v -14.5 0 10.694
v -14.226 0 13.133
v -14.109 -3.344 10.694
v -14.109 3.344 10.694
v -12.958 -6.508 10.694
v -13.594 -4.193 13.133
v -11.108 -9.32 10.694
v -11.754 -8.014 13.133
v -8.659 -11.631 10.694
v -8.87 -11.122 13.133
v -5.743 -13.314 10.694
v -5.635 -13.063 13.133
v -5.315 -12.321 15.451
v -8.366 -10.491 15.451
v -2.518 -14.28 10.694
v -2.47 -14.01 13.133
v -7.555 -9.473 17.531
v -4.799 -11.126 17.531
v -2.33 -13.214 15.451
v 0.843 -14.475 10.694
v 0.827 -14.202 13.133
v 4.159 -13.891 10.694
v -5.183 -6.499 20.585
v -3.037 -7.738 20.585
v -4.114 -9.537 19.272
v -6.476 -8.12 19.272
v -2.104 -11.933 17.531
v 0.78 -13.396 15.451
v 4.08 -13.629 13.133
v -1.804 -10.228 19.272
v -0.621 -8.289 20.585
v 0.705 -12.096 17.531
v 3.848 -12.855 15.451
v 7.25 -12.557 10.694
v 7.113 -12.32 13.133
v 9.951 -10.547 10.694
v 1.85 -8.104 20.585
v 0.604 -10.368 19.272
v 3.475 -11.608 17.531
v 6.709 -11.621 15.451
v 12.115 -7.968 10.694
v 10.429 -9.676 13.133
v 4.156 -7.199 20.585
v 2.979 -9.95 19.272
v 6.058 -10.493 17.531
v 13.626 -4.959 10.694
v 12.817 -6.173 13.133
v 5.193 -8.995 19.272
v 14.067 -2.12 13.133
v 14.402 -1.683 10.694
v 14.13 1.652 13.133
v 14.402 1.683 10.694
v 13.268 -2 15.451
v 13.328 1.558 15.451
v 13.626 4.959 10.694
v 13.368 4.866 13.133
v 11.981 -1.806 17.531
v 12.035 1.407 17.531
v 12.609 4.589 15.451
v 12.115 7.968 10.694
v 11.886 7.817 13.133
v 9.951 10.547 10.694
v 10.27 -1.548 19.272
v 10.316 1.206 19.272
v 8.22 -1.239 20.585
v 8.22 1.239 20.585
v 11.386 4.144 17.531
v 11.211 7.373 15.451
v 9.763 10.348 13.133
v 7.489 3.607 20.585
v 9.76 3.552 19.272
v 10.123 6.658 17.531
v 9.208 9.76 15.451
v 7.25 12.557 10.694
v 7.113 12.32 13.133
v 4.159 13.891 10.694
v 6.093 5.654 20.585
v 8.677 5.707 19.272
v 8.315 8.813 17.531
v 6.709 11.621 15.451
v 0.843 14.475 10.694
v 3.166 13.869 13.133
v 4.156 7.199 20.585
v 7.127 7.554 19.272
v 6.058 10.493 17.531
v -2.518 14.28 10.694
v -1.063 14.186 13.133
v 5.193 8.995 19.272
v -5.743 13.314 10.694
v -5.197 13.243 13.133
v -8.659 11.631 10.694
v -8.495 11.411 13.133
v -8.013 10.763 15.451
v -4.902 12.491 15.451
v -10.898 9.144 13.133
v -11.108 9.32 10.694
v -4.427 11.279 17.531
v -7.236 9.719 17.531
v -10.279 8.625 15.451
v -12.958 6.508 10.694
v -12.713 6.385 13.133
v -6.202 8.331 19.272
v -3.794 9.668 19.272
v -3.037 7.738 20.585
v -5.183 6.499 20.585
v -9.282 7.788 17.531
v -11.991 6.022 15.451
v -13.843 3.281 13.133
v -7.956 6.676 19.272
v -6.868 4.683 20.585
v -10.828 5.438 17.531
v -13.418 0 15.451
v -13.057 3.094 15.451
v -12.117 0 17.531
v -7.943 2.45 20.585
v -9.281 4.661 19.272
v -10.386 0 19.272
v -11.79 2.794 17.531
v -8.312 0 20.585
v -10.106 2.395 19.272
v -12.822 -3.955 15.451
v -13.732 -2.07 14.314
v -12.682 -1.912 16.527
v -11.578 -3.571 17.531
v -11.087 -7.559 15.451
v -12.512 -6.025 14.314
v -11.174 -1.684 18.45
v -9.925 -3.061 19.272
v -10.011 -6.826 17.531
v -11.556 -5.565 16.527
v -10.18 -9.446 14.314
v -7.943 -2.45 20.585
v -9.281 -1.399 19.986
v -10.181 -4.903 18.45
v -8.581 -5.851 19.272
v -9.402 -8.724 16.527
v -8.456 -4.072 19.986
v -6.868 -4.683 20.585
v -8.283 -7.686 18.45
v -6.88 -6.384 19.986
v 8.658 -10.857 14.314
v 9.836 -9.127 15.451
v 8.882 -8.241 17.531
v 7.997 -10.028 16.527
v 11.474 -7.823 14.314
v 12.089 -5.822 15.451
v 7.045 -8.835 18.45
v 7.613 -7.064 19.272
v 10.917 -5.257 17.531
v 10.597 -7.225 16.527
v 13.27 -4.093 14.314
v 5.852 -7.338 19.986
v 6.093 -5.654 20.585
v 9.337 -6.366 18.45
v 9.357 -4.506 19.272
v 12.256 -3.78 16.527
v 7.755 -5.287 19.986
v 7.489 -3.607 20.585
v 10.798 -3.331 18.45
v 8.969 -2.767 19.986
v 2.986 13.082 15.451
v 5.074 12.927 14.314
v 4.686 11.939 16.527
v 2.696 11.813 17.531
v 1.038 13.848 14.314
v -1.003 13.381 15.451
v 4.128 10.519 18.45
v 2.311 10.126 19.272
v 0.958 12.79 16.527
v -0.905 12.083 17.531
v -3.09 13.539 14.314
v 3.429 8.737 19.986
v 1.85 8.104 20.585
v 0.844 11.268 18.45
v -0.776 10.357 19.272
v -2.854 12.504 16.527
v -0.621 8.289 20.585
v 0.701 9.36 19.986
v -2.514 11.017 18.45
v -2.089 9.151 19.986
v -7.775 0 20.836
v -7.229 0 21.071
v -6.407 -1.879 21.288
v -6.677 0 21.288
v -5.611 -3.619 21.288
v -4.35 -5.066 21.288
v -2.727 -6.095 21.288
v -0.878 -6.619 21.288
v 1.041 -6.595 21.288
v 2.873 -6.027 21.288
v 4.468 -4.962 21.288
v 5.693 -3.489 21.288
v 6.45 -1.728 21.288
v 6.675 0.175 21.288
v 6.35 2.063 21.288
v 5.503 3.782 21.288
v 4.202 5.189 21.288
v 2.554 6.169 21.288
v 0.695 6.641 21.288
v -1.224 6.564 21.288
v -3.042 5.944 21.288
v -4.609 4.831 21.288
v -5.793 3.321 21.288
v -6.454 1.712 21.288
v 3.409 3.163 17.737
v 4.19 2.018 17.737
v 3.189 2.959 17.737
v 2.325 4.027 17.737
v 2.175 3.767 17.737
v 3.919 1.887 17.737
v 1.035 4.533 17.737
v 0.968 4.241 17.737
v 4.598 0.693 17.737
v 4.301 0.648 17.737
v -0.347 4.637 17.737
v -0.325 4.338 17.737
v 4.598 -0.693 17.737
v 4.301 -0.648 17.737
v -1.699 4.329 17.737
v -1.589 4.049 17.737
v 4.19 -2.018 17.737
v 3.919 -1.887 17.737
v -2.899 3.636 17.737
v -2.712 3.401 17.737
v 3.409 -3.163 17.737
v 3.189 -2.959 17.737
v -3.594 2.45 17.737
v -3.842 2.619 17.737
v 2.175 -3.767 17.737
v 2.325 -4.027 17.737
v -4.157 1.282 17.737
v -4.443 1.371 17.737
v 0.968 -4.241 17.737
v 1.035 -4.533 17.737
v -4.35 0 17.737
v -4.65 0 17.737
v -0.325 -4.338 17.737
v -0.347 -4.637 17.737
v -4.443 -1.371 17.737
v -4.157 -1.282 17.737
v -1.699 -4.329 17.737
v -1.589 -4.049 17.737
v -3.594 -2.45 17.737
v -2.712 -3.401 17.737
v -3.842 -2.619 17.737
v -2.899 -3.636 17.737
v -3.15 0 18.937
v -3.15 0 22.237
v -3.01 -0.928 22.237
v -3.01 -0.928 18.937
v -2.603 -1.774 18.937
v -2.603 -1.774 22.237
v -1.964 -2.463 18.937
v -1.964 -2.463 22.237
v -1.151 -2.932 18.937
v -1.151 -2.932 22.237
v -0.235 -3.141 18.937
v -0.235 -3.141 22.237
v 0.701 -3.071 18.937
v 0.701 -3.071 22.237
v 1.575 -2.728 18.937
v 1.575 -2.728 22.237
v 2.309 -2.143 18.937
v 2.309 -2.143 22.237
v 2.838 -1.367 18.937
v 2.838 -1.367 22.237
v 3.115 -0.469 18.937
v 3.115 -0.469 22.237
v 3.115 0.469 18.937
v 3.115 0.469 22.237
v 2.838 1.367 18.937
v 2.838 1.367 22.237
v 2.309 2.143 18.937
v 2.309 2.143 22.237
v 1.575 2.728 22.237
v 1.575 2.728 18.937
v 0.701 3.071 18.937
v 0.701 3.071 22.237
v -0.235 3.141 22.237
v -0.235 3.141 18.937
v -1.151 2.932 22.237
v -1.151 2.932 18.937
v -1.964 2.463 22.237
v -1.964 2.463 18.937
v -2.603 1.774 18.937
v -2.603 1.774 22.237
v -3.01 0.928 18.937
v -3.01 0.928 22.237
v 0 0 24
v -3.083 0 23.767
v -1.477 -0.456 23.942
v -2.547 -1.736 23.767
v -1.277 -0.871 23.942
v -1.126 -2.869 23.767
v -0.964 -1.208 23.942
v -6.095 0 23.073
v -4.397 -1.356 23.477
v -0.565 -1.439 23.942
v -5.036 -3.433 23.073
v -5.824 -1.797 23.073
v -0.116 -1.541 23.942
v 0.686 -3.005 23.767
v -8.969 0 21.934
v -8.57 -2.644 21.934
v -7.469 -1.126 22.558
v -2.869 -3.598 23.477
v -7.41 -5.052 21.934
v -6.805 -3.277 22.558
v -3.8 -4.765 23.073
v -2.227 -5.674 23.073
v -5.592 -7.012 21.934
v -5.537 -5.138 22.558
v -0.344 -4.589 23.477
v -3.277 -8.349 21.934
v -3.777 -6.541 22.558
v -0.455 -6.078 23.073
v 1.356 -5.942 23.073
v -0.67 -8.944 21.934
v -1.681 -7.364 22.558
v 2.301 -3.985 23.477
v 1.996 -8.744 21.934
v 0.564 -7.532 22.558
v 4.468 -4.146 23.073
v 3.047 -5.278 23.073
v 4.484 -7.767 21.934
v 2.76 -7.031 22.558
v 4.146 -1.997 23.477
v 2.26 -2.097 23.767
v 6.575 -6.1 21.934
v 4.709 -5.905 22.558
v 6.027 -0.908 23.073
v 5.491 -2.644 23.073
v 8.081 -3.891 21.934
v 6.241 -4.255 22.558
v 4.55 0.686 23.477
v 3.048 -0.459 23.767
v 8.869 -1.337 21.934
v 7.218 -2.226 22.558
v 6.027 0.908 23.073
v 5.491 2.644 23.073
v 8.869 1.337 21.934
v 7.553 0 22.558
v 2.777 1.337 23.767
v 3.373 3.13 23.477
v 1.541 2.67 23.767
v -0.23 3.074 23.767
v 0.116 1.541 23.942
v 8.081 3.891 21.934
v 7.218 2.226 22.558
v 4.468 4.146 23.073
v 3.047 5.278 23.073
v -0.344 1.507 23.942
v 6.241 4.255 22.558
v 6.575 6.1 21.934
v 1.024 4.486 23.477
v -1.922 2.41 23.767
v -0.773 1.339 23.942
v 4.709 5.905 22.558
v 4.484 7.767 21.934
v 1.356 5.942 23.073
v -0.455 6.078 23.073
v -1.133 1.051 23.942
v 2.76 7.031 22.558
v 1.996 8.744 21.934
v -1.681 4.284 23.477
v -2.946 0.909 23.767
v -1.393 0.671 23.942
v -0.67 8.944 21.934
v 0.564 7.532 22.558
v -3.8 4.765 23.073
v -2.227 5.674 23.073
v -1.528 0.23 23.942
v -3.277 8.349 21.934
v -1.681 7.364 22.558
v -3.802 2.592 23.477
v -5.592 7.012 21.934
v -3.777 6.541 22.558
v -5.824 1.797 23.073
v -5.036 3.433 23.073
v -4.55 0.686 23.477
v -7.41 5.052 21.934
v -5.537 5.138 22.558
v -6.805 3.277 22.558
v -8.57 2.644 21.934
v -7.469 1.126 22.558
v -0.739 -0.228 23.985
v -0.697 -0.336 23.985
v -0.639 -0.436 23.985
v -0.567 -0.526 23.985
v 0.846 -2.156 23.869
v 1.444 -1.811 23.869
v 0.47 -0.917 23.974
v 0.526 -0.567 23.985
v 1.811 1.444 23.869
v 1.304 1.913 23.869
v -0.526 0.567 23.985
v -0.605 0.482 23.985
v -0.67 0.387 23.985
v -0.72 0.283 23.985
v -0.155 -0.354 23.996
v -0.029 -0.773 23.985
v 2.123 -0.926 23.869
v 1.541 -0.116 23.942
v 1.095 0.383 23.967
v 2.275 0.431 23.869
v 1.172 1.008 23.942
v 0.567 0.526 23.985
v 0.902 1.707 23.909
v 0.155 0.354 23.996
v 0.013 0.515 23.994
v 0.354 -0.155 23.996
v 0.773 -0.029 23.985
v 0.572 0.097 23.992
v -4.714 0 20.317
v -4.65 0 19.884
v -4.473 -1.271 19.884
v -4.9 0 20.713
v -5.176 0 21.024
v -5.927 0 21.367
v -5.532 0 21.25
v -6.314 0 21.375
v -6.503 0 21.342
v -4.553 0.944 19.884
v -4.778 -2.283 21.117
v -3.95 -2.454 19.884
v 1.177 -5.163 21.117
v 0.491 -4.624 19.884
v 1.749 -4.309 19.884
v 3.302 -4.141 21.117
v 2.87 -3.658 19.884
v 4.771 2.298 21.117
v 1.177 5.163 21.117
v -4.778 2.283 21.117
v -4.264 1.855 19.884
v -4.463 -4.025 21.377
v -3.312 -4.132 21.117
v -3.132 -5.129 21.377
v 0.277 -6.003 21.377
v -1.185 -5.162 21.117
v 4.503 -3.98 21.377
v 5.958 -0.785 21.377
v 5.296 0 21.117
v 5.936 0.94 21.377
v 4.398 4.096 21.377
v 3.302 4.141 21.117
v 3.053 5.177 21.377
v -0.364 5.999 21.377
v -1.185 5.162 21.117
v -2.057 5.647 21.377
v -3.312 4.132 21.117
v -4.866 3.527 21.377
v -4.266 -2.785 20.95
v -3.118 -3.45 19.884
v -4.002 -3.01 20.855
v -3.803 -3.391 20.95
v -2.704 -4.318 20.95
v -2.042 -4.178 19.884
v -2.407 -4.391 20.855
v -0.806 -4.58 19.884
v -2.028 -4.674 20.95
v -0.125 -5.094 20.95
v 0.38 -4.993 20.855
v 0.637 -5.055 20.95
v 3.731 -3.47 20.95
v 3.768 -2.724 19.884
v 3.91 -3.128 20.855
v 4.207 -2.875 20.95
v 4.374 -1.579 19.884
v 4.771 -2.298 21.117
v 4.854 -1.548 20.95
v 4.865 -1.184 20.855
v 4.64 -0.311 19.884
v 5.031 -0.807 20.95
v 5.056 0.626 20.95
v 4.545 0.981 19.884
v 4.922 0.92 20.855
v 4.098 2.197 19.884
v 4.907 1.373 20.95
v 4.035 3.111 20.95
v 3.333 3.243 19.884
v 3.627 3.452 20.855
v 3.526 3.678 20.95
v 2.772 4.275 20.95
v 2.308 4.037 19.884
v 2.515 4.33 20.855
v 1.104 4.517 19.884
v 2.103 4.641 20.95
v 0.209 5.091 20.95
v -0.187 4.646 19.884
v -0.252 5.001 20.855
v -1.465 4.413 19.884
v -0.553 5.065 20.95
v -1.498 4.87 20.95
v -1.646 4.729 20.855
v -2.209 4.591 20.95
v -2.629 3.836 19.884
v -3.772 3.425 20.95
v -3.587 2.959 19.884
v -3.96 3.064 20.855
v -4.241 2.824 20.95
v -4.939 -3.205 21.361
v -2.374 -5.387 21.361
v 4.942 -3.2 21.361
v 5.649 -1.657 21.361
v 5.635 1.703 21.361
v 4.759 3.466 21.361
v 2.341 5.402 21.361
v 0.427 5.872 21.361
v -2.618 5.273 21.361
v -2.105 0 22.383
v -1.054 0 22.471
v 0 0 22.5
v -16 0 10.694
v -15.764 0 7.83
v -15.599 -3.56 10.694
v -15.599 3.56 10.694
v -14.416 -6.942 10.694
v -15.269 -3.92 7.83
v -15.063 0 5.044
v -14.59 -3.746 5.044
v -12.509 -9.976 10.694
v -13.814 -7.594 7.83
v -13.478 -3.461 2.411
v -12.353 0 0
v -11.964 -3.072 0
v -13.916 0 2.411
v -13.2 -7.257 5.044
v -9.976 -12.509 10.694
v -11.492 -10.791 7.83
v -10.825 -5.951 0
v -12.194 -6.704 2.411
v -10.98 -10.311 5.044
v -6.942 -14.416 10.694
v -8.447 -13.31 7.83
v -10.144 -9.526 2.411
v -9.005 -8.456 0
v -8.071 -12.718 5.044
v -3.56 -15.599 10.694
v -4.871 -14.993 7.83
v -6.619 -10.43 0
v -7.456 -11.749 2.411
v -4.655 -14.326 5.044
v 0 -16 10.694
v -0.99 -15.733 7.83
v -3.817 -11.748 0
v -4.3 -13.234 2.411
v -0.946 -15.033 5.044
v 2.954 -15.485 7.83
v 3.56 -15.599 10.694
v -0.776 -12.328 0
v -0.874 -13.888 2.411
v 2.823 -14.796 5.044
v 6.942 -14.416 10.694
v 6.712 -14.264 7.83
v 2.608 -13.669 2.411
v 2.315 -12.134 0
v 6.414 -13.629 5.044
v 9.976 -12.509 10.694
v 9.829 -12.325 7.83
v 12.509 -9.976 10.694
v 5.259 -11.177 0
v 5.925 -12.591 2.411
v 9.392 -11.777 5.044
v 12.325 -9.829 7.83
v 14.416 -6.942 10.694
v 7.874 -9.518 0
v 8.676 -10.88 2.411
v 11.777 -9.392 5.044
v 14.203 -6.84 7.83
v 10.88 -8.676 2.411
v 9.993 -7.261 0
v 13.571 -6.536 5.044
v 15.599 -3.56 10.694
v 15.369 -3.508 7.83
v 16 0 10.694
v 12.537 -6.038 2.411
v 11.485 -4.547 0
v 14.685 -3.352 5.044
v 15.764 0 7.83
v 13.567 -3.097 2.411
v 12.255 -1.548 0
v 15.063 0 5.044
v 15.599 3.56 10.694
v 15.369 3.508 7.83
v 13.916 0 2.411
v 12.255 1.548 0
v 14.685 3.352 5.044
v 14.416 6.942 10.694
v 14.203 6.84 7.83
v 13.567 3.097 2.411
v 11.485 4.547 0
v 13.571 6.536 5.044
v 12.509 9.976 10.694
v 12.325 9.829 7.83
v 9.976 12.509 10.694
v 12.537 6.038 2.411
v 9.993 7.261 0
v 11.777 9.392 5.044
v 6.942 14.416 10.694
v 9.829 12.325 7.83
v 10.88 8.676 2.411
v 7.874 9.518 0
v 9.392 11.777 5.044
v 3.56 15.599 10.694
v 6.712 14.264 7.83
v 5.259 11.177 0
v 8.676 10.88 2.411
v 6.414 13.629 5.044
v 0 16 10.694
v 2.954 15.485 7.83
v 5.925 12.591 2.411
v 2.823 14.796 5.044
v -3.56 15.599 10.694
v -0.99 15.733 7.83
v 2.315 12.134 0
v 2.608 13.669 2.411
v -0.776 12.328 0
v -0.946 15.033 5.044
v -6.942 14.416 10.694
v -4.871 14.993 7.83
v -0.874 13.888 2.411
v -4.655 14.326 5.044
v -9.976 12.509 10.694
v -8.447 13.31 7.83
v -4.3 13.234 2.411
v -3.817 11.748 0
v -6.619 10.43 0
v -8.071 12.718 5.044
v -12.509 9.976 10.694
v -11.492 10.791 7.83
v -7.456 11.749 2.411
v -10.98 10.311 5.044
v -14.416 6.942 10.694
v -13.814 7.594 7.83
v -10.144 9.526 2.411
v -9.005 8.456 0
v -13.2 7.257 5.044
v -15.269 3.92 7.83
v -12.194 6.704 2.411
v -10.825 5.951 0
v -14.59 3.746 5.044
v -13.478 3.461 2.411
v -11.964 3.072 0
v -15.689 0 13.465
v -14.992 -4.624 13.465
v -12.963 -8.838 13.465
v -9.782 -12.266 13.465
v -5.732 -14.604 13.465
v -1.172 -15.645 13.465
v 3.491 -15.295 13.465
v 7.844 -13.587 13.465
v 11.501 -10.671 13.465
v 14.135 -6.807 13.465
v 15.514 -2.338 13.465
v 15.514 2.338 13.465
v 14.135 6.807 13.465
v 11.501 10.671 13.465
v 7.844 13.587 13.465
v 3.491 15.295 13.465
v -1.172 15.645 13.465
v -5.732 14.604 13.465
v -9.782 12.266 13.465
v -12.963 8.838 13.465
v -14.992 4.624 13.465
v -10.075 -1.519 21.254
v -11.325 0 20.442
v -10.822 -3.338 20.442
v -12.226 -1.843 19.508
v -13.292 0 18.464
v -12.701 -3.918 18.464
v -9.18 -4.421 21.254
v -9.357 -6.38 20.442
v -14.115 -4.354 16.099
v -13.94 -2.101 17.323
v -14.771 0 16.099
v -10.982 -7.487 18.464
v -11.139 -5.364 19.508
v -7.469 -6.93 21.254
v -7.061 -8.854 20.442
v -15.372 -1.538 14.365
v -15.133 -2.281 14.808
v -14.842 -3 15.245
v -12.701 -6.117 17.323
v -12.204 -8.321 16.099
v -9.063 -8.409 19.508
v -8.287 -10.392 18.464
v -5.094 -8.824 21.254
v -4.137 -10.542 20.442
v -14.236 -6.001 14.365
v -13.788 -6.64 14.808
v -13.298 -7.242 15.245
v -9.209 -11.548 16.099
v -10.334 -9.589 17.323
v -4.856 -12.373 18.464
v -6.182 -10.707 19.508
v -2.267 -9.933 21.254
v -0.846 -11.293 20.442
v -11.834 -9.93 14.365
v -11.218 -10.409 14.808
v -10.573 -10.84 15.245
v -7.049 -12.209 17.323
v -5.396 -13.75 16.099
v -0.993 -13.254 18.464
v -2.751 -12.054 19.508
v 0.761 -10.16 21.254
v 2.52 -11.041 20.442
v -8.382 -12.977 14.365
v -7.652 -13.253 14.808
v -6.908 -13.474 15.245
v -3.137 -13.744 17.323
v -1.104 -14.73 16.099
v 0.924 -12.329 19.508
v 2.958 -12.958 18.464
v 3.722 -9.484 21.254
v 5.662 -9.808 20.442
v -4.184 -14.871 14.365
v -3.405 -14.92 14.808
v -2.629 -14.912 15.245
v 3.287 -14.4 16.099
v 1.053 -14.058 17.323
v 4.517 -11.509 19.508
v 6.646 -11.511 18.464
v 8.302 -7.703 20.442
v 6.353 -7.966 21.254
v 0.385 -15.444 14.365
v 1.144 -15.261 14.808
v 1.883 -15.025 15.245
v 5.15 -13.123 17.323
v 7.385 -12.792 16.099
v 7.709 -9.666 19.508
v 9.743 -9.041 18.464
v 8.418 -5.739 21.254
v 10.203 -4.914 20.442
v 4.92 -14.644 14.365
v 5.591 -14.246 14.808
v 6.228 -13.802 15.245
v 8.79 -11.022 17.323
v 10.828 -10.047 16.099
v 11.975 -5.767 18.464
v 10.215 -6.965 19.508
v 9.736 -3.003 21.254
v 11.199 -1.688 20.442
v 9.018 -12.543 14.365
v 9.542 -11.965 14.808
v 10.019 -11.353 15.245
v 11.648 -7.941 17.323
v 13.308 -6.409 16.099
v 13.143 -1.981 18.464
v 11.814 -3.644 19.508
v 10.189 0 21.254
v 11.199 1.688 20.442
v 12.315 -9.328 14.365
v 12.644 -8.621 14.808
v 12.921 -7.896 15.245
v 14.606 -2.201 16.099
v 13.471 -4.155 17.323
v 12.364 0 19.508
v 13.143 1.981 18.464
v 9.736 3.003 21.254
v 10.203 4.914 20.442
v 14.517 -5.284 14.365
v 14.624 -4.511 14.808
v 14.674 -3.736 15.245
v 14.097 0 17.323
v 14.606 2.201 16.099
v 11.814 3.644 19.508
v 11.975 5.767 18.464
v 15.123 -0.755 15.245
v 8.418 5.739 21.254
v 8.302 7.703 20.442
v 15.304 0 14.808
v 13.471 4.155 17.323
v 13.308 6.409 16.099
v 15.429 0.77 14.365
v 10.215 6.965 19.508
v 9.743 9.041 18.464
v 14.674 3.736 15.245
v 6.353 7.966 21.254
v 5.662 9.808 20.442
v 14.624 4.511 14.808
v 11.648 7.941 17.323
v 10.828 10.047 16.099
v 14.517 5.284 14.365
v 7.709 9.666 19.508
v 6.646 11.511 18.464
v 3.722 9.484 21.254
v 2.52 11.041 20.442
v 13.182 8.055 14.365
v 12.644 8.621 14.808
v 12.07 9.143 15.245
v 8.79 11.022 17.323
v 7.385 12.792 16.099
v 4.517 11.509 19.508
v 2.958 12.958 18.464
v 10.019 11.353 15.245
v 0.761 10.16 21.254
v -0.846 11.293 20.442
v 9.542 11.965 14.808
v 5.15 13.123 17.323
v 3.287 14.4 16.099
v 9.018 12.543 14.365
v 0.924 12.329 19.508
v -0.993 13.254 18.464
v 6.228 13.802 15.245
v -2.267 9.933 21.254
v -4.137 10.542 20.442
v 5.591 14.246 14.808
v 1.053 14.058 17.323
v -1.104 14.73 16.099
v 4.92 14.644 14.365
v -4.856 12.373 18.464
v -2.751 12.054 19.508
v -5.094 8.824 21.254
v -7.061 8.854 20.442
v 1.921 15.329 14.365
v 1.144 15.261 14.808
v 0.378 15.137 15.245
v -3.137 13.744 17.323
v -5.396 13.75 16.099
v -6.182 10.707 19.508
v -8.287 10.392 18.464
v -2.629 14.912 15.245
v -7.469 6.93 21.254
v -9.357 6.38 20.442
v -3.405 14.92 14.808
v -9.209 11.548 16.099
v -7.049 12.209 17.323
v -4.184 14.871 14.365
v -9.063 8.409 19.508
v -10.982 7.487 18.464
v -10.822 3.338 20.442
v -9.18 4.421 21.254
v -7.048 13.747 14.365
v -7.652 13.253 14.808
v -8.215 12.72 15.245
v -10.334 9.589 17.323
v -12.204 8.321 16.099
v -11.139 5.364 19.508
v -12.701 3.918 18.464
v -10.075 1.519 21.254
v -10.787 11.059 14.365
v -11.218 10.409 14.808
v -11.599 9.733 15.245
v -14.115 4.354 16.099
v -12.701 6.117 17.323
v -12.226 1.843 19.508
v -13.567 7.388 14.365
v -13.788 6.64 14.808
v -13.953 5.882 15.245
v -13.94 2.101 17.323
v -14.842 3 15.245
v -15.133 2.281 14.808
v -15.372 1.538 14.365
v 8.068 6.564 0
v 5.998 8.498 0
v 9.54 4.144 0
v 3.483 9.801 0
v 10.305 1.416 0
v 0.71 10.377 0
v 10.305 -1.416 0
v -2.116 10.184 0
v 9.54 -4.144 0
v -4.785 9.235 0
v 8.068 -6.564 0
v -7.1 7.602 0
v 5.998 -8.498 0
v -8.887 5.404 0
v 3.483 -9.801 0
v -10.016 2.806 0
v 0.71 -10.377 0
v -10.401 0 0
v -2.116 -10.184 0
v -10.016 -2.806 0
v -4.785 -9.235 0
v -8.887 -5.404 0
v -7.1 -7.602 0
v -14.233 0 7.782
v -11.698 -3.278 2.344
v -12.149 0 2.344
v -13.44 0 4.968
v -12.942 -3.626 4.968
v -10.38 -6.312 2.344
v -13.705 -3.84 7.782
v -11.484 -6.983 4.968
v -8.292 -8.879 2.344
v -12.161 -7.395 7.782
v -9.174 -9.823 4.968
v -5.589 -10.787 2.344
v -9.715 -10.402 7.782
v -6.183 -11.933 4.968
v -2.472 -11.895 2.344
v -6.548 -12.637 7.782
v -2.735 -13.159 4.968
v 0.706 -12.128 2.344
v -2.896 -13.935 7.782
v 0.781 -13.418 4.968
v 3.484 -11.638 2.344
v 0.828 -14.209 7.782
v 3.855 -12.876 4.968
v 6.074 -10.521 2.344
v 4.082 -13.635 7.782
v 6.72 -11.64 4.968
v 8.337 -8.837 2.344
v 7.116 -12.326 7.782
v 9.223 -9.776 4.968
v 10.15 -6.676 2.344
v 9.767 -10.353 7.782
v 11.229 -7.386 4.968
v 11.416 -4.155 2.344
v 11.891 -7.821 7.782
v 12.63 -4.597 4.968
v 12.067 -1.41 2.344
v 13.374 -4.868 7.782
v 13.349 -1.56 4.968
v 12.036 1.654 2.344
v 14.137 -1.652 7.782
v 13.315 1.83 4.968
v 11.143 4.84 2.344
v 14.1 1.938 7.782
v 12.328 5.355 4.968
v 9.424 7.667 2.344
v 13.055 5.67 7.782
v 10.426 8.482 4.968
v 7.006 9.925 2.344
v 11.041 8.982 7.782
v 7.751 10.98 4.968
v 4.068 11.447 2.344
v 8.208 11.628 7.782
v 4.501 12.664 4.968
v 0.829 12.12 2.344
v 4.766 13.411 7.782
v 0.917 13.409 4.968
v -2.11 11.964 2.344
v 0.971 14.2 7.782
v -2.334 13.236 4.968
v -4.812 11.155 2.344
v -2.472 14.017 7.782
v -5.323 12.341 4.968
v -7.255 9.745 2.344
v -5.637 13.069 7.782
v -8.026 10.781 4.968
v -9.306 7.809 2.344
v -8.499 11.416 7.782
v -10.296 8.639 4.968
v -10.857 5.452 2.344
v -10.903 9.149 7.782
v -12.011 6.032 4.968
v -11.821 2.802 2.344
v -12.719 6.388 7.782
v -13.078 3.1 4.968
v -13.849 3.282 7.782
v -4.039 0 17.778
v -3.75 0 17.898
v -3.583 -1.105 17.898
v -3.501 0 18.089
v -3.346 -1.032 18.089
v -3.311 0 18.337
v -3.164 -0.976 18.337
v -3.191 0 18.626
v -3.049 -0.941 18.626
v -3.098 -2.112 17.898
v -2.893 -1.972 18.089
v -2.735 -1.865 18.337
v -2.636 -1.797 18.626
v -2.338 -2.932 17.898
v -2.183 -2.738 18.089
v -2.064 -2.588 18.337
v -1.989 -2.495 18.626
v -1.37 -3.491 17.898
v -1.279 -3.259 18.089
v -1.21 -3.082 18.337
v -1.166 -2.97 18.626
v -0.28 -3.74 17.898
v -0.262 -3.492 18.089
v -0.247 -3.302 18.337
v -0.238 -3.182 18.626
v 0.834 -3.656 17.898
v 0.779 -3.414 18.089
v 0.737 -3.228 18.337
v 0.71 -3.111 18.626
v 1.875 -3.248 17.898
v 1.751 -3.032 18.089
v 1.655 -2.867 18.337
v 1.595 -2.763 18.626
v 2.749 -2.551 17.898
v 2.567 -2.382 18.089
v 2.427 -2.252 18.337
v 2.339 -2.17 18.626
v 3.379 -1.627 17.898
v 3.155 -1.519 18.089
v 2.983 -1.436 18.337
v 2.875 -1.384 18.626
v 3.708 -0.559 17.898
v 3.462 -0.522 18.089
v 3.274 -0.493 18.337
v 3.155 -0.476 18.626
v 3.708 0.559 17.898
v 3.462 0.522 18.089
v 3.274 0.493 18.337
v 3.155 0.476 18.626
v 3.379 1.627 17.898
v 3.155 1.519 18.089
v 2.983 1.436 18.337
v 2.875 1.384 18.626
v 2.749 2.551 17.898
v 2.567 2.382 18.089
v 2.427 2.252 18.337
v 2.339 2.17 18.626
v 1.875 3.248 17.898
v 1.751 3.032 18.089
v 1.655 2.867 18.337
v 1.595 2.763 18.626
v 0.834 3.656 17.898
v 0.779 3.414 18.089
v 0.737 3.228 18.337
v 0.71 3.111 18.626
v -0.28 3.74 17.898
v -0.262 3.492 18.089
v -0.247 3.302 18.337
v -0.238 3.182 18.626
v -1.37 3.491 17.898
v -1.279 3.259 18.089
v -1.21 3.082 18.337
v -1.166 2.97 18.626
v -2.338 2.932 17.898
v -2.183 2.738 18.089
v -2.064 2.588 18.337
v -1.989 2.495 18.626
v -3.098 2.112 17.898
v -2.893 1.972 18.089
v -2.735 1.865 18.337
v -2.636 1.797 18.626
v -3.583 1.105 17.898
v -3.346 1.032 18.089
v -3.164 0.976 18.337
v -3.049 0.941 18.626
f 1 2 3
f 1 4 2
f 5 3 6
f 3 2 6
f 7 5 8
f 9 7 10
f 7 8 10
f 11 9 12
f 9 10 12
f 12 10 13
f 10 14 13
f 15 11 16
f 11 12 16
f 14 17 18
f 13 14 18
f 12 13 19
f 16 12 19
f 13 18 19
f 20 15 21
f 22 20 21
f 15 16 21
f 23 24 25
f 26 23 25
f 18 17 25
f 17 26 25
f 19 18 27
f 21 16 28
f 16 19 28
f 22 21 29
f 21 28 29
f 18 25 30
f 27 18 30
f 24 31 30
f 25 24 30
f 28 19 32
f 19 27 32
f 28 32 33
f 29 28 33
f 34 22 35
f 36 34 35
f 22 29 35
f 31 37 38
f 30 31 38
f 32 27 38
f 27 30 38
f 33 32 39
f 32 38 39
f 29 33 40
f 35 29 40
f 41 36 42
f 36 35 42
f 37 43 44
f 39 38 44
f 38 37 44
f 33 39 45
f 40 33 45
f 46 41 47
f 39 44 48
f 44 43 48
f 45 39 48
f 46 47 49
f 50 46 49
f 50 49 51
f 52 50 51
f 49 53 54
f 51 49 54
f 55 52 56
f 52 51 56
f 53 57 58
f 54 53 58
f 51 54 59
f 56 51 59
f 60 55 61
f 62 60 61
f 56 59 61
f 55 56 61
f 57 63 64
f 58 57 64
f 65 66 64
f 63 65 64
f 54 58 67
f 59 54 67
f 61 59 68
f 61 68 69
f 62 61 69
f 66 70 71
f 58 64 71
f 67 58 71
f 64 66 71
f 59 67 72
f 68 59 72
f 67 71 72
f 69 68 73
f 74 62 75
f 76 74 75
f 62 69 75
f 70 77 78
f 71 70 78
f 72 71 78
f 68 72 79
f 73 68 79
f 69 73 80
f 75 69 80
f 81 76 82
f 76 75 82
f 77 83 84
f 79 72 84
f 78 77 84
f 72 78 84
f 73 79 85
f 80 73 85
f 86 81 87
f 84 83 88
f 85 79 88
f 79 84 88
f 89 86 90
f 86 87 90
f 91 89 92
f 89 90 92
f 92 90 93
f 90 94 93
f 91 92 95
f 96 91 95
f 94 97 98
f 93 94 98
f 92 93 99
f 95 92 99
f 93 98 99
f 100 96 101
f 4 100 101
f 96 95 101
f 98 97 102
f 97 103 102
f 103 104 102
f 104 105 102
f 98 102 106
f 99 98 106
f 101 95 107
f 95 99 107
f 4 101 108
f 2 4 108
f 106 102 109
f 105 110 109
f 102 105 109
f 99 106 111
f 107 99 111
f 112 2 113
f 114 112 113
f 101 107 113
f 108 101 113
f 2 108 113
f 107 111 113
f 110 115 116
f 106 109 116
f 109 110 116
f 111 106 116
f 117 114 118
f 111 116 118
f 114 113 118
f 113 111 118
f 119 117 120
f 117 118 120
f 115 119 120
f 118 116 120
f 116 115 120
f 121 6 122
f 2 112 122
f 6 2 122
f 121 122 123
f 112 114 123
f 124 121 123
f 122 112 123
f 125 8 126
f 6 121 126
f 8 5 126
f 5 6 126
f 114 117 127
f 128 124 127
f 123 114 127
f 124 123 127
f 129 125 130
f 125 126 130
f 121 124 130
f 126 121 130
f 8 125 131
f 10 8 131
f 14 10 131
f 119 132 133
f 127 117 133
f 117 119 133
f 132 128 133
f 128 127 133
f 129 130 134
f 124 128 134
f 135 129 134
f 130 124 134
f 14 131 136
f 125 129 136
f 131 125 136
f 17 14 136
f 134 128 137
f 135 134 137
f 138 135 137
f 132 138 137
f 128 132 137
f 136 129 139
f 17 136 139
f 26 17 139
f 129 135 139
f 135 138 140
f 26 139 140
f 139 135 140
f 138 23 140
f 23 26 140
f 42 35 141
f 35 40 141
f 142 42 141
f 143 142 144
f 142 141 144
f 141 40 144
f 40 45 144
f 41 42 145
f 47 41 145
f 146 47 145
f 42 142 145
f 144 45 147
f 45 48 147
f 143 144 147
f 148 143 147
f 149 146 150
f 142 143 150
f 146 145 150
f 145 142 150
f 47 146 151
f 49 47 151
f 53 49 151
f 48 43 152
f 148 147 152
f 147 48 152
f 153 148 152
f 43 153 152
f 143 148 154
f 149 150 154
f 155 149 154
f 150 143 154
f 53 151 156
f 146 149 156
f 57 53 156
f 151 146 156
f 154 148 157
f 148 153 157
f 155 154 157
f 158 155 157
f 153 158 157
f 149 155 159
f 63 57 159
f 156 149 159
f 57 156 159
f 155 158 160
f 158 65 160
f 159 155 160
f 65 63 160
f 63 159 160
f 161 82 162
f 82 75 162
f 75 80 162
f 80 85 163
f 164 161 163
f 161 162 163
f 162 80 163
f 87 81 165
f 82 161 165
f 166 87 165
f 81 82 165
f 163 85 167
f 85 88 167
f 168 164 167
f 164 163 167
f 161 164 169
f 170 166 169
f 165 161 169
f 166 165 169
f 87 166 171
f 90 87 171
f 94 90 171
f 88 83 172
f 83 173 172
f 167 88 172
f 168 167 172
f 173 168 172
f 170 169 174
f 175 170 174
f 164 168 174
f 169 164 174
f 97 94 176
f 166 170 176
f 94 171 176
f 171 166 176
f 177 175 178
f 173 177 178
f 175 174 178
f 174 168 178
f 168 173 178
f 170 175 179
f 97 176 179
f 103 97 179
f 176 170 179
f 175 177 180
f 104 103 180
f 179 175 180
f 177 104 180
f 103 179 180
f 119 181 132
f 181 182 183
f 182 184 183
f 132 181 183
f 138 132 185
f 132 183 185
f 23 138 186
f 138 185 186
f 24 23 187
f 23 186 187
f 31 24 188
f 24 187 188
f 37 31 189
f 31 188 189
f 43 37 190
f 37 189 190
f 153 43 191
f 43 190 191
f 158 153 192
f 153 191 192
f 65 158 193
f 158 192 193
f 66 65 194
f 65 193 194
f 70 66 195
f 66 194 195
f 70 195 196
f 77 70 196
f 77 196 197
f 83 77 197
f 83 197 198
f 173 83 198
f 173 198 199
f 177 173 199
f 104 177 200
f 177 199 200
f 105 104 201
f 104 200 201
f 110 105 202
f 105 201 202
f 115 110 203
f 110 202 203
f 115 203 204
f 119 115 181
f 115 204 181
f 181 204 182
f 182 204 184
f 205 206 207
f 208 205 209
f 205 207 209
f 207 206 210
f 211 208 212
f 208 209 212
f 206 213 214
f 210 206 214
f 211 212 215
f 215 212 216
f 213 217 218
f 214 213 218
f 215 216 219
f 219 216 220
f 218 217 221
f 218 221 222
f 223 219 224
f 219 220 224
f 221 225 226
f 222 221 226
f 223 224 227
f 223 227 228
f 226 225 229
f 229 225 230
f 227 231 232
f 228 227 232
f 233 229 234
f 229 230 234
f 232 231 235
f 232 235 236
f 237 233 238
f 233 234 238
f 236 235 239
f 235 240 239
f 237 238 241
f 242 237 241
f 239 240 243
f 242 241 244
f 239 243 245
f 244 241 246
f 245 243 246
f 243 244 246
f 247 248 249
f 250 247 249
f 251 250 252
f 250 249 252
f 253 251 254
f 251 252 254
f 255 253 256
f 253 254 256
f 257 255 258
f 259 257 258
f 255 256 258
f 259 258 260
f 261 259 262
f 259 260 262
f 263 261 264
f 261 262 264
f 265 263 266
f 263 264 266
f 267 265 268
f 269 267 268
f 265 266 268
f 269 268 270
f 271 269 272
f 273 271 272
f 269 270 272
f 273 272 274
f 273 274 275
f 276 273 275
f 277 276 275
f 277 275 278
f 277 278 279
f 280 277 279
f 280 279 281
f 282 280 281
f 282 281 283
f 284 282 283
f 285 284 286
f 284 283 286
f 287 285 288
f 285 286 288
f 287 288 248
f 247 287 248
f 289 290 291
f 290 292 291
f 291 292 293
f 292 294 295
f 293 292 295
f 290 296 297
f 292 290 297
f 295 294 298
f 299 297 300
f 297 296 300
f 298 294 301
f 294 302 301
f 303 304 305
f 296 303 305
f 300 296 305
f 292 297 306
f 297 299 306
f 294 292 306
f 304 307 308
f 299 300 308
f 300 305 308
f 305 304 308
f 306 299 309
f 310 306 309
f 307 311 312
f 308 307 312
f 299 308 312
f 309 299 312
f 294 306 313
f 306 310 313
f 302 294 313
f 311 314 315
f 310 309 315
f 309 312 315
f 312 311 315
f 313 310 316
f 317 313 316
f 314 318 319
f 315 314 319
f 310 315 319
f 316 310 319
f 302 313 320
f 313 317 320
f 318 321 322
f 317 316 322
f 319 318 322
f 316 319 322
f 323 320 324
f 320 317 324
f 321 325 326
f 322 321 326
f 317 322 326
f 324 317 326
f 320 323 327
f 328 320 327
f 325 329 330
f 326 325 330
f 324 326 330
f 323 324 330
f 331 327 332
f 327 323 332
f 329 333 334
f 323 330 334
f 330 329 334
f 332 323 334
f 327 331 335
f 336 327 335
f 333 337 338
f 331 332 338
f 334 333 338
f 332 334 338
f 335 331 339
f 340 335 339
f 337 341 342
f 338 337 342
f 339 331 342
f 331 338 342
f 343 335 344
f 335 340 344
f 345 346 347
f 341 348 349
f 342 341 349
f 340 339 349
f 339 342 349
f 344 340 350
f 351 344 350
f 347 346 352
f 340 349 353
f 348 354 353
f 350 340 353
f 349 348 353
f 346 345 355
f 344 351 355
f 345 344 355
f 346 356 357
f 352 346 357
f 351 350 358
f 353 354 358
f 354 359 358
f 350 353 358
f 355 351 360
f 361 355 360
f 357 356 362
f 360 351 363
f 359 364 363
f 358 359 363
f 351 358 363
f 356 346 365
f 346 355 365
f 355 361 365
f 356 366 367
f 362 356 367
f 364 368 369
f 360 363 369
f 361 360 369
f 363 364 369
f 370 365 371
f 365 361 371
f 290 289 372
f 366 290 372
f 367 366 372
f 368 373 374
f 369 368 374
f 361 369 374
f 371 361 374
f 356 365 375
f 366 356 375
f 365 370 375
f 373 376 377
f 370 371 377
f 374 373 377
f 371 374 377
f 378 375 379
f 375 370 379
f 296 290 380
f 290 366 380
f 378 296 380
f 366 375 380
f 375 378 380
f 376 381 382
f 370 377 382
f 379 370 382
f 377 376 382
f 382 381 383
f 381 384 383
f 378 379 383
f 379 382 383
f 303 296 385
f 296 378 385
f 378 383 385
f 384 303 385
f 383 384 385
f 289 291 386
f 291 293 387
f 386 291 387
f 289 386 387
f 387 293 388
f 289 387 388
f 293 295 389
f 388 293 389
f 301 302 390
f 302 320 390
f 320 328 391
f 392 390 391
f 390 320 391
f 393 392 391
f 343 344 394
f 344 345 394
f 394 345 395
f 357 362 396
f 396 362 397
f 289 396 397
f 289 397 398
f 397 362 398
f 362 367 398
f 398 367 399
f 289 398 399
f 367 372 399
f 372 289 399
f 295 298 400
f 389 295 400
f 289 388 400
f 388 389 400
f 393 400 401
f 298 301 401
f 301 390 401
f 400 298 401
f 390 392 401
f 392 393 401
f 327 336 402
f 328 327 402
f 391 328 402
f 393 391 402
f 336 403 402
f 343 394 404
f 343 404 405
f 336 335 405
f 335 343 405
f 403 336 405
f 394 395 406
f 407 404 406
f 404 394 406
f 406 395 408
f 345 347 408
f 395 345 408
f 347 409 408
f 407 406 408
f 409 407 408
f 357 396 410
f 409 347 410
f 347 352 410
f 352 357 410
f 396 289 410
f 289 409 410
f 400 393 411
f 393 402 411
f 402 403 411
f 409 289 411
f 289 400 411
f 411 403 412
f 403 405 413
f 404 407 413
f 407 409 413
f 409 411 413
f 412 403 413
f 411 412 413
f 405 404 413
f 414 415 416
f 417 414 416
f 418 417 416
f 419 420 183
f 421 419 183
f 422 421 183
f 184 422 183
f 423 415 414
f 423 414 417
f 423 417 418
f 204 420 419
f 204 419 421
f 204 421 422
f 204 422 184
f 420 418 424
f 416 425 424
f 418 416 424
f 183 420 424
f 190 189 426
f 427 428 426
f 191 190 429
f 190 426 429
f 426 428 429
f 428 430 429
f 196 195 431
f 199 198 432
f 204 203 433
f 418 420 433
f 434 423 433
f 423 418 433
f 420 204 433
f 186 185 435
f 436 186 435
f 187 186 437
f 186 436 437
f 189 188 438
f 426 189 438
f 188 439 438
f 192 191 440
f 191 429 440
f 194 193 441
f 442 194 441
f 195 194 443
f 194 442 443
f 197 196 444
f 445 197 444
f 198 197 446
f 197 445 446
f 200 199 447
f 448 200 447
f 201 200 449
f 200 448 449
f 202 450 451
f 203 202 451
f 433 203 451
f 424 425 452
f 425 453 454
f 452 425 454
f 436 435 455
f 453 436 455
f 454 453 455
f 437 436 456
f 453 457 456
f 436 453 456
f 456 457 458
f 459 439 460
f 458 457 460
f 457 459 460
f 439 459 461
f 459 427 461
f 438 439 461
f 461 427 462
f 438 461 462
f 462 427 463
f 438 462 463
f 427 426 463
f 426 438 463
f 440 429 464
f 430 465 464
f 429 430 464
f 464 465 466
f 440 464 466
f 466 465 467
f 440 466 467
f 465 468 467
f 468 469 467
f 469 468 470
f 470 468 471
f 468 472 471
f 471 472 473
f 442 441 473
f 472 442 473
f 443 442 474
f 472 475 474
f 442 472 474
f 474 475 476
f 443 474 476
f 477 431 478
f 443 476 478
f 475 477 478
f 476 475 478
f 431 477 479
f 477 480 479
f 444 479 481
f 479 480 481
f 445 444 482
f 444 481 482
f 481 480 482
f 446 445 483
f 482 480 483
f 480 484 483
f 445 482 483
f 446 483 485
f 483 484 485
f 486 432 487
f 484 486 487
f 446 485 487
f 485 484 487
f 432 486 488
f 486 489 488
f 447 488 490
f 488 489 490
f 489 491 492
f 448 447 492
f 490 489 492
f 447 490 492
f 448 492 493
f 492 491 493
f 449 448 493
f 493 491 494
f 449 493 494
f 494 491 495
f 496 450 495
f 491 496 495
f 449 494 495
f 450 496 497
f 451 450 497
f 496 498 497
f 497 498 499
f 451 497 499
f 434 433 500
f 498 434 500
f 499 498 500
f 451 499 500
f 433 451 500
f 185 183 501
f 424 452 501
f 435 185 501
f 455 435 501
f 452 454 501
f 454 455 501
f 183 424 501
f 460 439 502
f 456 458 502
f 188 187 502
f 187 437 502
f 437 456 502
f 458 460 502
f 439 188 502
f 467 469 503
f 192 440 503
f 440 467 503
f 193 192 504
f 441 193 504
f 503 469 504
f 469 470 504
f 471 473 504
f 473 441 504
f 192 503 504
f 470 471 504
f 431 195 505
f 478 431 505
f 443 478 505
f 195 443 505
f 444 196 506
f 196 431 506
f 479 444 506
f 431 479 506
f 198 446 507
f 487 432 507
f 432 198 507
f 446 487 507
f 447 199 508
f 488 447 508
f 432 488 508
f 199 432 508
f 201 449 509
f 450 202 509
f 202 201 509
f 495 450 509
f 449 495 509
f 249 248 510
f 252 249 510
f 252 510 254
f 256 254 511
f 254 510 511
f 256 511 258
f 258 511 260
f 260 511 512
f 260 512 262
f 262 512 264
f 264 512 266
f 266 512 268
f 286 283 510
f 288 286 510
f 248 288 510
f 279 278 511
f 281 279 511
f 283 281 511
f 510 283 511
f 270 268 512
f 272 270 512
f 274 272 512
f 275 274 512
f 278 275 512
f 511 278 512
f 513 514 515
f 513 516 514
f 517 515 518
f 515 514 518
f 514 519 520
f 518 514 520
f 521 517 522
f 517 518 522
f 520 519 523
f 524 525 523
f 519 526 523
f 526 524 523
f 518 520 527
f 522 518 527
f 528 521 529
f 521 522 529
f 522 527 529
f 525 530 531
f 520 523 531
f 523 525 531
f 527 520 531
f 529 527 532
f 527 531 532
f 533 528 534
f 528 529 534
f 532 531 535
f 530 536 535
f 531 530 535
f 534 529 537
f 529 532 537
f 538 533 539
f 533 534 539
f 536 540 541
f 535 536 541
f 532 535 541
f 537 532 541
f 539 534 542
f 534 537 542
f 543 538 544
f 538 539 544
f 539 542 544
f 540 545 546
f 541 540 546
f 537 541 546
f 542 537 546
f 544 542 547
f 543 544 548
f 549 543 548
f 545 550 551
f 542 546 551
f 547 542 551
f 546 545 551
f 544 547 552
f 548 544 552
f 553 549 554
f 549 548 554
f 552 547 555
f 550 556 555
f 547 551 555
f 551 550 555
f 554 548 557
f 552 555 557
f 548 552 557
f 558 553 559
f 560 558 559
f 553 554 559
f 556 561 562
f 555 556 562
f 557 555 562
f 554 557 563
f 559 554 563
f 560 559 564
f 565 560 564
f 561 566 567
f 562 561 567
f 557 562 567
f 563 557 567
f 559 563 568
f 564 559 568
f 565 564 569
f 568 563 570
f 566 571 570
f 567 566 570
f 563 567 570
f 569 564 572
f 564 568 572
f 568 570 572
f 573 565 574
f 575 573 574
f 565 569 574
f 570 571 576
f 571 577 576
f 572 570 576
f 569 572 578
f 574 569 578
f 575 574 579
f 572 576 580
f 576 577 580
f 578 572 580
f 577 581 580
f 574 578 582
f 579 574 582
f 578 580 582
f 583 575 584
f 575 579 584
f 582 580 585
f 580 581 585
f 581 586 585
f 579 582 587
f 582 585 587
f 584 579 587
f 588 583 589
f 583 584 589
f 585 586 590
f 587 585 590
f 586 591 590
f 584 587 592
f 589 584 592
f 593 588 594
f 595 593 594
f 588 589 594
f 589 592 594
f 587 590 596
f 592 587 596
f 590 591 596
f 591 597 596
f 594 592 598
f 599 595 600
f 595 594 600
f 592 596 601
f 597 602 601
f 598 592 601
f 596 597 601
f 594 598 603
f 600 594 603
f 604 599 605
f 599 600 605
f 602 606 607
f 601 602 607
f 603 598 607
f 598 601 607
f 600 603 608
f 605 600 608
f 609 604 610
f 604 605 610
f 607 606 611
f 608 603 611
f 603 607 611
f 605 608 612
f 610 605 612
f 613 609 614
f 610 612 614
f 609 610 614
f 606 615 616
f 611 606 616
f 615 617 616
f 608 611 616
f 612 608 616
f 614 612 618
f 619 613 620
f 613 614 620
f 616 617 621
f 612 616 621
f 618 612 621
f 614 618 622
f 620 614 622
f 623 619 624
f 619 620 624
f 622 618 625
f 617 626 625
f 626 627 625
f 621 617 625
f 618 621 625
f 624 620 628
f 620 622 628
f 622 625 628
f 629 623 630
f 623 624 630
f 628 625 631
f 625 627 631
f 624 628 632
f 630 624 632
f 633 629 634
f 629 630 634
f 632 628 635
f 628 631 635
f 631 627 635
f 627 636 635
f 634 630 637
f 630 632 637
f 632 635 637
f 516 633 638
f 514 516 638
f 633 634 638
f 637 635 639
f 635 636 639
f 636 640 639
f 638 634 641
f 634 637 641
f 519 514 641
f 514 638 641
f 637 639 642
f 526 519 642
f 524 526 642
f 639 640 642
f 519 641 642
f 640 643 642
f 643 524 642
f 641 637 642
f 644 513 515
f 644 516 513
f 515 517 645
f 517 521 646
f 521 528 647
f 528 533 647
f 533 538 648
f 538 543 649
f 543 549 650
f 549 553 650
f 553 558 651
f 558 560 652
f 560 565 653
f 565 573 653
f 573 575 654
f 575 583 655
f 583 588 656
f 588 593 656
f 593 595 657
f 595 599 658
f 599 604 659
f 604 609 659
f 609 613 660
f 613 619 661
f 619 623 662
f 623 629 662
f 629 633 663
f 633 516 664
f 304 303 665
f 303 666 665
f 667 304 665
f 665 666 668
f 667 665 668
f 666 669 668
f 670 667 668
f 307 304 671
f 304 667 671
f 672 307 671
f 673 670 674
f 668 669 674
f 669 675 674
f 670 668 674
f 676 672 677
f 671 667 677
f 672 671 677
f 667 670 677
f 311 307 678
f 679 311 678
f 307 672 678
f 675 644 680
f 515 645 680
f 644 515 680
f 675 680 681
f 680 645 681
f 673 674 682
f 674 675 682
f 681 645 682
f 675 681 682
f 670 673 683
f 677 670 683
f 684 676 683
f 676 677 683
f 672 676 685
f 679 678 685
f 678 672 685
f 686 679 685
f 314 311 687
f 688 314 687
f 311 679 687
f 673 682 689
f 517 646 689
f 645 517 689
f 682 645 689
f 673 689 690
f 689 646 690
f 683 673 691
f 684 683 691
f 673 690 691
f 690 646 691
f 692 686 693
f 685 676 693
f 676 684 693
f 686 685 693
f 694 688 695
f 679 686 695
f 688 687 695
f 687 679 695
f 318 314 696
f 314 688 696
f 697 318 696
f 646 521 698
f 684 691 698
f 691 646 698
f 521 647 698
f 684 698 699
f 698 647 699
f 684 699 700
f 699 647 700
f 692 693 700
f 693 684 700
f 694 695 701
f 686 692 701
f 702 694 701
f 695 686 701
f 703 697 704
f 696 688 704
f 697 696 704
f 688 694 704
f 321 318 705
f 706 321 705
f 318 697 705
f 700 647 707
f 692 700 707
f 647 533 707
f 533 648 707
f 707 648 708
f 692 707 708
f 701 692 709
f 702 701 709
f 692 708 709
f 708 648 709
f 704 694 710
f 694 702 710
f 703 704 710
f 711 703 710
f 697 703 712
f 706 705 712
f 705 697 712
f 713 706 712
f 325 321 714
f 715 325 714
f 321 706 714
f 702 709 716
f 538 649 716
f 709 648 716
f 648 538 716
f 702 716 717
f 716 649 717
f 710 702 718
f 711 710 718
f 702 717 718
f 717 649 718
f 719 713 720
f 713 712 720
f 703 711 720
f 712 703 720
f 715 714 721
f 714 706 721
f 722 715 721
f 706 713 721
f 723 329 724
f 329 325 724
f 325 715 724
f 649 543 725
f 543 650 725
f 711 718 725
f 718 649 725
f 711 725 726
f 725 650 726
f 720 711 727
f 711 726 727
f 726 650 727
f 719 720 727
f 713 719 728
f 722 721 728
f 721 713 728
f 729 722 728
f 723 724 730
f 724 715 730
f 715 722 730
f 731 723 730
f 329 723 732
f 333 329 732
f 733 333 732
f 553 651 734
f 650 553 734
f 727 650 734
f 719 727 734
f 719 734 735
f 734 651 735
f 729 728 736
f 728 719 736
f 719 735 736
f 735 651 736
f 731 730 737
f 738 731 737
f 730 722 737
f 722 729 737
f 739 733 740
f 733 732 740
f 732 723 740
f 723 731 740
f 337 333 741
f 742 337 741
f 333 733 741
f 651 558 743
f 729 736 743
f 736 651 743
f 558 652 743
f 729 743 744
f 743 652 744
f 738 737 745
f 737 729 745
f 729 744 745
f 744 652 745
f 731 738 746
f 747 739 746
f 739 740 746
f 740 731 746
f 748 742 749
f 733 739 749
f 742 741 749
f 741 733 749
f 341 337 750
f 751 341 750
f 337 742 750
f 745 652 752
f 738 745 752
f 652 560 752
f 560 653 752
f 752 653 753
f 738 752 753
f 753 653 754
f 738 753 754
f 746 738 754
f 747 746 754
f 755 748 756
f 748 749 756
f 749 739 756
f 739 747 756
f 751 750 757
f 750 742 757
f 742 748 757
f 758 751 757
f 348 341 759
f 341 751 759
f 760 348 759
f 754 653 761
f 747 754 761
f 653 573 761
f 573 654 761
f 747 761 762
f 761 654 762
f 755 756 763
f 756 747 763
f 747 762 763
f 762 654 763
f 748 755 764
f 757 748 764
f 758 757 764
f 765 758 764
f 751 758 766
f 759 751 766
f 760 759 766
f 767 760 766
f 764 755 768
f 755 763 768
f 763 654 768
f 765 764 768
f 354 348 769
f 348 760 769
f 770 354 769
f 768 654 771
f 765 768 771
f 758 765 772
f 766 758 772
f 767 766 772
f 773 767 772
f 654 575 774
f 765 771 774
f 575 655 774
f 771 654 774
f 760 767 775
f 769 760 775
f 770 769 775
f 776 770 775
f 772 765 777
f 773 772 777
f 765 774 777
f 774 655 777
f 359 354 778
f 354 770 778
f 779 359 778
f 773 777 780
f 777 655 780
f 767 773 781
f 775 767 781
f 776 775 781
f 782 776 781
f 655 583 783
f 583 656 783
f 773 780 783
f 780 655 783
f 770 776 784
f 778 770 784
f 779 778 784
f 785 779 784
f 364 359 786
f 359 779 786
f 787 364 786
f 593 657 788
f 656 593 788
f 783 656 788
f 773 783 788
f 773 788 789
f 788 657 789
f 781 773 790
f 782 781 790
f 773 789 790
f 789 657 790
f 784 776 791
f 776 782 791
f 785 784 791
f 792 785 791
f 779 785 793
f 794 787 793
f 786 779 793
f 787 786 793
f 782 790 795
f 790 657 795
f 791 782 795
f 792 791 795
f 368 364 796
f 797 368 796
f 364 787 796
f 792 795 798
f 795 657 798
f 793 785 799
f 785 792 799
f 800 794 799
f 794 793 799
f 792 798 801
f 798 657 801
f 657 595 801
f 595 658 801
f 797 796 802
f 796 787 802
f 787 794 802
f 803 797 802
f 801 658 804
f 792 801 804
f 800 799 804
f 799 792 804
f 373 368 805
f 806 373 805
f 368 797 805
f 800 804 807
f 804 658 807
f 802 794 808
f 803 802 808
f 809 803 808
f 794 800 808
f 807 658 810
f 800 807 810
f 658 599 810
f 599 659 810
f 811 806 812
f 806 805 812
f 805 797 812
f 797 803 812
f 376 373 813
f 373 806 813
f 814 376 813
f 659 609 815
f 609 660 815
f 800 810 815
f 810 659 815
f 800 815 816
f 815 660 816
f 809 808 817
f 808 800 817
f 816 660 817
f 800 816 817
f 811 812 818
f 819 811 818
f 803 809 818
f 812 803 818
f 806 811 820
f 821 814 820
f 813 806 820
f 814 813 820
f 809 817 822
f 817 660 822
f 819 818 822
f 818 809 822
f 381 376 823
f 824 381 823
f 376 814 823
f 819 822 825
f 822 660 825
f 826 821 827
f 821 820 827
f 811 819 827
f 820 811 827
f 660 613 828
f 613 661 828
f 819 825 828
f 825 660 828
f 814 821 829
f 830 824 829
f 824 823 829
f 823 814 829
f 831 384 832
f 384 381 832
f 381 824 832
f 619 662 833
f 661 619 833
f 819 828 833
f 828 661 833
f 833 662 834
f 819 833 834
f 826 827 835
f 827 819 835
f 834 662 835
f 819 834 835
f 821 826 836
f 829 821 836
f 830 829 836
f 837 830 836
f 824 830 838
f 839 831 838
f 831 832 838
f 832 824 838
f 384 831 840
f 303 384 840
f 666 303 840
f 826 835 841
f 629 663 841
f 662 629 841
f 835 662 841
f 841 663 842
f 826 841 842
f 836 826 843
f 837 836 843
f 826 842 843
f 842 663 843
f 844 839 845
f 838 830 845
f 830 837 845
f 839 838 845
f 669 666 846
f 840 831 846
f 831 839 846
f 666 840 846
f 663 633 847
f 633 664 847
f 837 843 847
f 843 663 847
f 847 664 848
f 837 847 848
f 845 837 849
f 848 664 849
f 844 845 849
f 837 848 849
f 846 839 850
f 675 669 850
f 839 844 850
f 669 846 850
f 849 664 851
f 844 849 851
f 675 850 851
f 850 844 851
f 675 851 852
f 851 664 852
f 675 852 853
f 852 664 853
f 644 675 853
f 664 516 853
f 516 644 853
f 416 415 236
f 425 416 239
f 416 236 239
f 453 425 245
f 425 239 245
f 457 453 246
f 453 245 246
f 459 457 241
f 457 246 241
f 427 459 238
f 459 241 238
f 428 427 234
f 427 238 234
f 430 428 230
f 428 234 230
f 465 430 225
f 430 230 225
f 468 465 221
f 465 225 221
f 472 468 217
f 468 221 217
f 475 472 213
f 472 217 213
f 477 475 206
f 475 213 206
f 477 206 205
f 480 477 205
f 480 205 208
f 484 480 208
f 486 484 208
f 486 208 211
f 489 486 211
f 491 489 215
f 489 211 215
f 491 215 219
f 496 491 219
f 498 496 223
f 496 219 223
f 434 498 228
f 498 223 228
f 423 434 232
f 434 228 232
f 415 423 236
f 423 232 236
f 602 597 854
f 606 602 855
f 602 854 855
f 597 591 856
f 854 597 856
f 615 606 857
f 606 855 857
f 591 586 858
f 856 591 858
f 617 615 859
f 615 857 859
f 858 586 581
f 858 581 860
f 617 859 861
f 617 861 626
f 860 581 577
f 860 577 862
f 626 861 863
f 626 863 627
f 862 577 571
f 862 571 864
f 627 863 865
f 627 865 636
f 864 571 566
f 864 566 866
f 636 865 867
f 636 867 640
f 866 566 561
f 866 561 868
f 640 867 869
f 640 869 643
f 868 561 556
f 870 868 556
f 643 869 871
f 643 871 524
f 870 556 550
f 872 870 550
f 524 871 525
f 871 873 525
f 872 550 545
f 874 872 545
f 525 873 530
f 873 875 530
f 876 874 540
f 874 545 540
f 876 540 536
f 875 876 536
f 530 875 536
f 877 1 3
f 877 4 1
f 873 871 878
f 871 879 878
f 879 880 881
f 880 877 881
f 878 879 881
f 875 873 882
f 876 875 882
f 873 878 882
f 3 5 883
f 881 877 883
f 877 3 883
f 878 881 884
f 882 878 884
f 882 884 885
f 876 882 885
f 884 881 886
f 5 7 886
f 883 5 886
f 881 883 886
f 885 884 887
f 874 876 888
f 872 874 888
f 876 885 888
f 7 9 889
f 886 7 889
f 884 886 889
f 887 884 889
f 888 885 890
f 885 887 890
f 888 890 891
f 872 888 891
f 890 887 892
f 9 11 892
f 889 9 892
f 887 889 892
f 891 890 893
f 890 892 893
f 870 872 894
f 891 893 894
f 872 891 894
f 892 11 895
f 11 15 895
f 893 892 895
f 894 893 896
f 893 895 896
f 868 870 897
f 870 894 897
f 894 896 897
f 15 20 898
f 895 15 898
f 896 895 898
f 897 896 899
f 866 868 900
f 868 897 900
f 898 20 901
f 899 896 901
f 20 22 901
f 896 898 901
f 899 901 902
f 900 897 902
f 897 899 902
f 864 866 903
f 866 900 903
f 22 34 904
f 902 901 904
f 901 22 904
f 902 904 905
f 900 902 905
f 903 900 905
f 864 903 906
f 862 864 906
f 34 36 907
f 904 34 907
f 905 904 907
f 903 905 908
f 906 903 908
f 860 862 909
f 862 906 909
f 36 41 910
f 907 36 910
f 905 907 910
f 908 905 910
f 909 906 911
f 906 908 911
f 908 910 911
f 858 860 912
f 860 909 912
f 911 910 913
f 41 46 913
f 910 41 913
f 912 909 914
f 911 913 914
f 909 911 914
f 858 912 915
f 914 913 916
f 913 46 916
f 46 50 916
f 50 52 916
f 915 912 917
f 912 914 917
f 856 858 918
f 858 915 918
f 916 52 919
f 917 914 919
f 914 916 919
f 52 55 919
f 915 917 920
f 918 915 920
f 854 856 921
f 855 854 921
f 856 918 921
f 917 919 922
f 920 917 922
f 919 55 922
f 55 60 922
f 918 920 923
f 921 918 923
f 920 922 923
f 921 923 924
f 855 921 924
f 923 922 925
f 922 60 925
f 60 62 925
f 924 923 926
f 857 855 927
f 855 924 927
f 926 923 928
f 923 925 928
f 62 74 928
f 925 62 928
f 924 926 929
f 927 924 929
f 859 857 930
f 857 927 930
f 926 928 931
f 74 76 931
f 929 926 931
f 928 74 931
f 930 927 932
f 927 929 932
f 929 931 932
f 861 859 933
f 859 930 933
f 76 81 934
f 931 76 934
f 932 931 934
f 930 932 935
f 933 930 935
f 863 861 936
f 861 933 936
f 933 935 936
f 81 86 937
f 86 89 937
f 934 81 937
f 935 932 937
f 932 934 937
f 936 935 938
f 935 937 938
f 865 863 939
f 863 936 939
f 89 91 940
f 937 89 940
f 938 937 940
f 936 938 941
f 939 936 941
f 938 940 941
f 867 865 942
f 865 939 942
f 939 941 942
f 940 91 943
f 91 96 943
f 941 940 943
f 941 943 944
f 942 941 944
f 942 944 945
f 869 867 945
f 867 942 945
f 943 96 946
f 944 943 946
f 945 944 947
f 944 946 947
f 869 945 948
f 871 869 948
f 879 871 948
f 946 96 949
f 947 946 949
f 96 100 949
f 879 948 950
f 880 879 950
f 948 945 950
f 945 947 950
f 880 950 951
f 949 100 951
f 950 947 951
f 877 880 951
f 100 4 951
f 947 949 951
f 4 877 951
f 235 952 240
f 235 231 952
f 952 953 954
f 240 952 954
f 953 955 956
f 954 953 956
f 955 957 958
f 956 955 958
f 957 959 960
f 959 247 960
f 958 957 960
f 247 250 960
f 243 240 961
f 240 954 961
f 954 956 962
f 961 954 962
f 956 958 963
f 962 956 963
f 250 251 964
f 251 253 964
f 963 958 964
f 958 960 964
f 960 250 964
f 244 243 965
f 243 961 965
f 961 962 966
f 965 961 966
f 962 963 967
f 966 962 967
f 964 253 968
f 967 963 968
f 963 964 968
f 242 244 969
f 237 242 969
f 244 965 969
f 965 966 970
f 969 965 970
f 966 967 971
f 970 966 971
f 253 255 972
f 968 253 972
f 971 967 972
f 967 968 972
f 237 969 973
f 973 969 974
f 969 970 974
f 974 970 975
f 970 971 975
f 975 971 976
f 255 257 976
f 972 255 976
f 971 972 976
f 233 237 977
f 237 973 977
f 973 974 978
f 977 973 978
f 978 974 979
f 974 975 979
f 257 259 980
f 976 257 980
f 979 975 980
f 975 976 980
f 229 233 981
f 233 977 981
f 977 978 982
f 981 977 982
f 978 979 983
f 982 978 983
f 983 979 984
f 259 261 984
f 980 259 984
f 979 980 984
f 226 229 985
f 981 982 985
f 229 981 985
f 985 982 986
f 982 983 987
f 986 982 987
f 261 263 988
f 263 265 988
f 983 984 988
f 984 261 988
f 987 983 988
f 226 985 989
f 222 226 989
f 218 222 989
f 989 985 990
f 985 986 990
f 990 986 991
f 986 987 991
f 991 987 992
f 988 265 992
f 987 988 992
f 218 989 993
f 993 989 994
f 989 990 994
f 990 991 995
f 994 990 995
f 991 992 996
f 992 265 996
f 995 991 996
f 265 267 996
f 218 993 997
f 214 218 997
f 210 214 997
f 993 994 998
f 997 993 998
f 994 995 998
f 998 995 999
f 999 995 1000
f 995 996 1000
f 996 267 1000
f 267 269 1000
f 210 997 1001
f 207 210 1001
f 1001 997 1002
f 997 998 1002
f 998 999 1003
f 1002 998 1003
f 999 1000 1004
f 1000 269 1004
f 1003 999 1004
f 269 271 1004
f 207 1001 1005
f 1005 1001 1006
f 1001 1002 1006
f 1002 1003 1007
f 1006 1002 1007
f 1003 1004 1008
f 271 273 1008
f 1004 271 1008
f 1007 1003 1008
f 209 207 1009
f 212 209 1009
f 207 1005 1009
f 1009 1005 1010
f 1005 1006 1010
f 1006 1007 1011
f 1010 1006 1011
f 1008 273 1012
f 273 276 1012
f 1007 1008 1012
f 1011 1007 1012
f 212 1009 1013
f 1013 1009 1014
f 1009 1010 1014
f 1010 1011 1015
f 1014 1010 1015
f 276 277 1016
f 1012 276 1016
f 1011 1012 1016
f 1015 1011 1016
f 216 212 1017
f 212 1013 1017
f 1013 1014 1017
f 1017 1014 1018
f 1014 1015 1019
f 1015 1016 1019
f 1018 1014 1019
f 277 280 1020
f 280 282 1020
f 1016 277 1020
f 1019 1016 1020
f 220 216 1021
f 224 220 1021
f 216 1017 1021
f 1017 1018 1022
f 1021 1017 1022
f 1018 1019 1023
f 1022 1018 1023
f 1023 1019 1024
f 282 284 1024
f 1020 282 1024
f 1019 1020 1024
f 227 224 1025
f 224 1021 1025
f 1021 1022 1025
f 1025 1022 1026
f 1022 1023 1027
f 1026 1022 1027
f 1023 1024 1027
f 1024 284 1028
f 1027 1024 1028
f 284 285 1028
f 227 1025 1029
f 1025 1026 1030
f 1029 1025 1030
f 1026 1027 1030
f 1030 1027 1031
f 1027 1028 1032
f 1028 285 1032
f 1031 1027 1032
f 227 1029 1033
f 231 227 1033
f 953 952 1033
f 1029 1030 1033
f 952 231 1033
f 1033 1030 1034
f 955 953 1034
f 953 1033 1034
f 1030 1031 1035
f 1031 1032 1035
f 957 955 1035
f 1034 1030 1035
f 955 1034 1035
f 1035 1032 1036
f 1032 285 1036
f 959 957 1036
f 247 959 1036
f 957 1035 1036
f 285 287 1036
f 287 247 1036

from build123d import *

# Parameters (mm, degrees)
F2_R = 1.2
F3_R = 1.5


# Not quite as in the source:
# - ends of sketch curves that miss each other by under 0.0002 mm in the source are joined


with BuildPart() as f1:
    # F0 (on Front) → F1 (revolve)
    with BuildSketch(Plane.XZ):
        with BuildLine():
            ThreePointArc((-3.15, 22.237062203), (-3.9031761874, 22.0947631243), (-4.65, 21.92220128))
            Line((-4.65, 21.92220128), (-4.65, 17.737062203))
            Line((-4.65, 17.737062203), (-3.15, 17.737062203))
            Line((-3.15, 17.737062203), (-3.15, 22.237062203))
        make_face()
        with BuildLine():
            ThreePointArc((-8.3124990512, 20.5851502634), (-6.5156367124, 21.3478704117), (-4.65, 21.92220128))
            ThreePointArc((-4.65, 21.92220128), (-3.9031761874, 22.0947631243), (-3.15, 22.237062203))
            ThreePointArc((-3.15, 22.237062203), (-1.5804774821, 22.4341514446), (0, 22.5))
            Line((0, 22.5), (0, 24))
            ThreePointArc((0, 24), (-4.6018178135, 23.4768187956), (-8.9687491511, 21.933978275))
            ThreePointArc((-8.9687491511, 21.933978275), (-14.0973903538, 17.3228740591), (-16, 10.6937474793))
            ThreePointArc((-16, 10.6937474793), (-15.0630616225, 5.0444120813), (-12.3525726045, 0))
            Line((-12.3525726045, 0), (-10.4014182071, 0))
            ThreePointArc((-10.4014182071, 0), (-13.4402589307, 4.9676099375), (-14.4999996005, 10.6937474793))
            ThreePointArc((-14.4999996005, 10.6937474793), (-12.8257031653, 16.5273786831), (-8.3124990512, 20.5851502634))
        make_face()
    revolve(axis=Axis((0, 0, 23.25), (0, 0, 1)))

    # F2
    f2_edges = [f1.edges().sort_by_distance(p)[0] for p in [
        (3.15, 0, 17.737062),
    ]]
    fillet(f2_edges, radius=F2_R)

    # F3
    f3_edges = [f1.edges().sort_by_distance(p)[0] for p in [
        (4.65, 0, 21.922201),
    ]]
    fillet(f3_edges, radius=F3_R)


solid = f1.part
